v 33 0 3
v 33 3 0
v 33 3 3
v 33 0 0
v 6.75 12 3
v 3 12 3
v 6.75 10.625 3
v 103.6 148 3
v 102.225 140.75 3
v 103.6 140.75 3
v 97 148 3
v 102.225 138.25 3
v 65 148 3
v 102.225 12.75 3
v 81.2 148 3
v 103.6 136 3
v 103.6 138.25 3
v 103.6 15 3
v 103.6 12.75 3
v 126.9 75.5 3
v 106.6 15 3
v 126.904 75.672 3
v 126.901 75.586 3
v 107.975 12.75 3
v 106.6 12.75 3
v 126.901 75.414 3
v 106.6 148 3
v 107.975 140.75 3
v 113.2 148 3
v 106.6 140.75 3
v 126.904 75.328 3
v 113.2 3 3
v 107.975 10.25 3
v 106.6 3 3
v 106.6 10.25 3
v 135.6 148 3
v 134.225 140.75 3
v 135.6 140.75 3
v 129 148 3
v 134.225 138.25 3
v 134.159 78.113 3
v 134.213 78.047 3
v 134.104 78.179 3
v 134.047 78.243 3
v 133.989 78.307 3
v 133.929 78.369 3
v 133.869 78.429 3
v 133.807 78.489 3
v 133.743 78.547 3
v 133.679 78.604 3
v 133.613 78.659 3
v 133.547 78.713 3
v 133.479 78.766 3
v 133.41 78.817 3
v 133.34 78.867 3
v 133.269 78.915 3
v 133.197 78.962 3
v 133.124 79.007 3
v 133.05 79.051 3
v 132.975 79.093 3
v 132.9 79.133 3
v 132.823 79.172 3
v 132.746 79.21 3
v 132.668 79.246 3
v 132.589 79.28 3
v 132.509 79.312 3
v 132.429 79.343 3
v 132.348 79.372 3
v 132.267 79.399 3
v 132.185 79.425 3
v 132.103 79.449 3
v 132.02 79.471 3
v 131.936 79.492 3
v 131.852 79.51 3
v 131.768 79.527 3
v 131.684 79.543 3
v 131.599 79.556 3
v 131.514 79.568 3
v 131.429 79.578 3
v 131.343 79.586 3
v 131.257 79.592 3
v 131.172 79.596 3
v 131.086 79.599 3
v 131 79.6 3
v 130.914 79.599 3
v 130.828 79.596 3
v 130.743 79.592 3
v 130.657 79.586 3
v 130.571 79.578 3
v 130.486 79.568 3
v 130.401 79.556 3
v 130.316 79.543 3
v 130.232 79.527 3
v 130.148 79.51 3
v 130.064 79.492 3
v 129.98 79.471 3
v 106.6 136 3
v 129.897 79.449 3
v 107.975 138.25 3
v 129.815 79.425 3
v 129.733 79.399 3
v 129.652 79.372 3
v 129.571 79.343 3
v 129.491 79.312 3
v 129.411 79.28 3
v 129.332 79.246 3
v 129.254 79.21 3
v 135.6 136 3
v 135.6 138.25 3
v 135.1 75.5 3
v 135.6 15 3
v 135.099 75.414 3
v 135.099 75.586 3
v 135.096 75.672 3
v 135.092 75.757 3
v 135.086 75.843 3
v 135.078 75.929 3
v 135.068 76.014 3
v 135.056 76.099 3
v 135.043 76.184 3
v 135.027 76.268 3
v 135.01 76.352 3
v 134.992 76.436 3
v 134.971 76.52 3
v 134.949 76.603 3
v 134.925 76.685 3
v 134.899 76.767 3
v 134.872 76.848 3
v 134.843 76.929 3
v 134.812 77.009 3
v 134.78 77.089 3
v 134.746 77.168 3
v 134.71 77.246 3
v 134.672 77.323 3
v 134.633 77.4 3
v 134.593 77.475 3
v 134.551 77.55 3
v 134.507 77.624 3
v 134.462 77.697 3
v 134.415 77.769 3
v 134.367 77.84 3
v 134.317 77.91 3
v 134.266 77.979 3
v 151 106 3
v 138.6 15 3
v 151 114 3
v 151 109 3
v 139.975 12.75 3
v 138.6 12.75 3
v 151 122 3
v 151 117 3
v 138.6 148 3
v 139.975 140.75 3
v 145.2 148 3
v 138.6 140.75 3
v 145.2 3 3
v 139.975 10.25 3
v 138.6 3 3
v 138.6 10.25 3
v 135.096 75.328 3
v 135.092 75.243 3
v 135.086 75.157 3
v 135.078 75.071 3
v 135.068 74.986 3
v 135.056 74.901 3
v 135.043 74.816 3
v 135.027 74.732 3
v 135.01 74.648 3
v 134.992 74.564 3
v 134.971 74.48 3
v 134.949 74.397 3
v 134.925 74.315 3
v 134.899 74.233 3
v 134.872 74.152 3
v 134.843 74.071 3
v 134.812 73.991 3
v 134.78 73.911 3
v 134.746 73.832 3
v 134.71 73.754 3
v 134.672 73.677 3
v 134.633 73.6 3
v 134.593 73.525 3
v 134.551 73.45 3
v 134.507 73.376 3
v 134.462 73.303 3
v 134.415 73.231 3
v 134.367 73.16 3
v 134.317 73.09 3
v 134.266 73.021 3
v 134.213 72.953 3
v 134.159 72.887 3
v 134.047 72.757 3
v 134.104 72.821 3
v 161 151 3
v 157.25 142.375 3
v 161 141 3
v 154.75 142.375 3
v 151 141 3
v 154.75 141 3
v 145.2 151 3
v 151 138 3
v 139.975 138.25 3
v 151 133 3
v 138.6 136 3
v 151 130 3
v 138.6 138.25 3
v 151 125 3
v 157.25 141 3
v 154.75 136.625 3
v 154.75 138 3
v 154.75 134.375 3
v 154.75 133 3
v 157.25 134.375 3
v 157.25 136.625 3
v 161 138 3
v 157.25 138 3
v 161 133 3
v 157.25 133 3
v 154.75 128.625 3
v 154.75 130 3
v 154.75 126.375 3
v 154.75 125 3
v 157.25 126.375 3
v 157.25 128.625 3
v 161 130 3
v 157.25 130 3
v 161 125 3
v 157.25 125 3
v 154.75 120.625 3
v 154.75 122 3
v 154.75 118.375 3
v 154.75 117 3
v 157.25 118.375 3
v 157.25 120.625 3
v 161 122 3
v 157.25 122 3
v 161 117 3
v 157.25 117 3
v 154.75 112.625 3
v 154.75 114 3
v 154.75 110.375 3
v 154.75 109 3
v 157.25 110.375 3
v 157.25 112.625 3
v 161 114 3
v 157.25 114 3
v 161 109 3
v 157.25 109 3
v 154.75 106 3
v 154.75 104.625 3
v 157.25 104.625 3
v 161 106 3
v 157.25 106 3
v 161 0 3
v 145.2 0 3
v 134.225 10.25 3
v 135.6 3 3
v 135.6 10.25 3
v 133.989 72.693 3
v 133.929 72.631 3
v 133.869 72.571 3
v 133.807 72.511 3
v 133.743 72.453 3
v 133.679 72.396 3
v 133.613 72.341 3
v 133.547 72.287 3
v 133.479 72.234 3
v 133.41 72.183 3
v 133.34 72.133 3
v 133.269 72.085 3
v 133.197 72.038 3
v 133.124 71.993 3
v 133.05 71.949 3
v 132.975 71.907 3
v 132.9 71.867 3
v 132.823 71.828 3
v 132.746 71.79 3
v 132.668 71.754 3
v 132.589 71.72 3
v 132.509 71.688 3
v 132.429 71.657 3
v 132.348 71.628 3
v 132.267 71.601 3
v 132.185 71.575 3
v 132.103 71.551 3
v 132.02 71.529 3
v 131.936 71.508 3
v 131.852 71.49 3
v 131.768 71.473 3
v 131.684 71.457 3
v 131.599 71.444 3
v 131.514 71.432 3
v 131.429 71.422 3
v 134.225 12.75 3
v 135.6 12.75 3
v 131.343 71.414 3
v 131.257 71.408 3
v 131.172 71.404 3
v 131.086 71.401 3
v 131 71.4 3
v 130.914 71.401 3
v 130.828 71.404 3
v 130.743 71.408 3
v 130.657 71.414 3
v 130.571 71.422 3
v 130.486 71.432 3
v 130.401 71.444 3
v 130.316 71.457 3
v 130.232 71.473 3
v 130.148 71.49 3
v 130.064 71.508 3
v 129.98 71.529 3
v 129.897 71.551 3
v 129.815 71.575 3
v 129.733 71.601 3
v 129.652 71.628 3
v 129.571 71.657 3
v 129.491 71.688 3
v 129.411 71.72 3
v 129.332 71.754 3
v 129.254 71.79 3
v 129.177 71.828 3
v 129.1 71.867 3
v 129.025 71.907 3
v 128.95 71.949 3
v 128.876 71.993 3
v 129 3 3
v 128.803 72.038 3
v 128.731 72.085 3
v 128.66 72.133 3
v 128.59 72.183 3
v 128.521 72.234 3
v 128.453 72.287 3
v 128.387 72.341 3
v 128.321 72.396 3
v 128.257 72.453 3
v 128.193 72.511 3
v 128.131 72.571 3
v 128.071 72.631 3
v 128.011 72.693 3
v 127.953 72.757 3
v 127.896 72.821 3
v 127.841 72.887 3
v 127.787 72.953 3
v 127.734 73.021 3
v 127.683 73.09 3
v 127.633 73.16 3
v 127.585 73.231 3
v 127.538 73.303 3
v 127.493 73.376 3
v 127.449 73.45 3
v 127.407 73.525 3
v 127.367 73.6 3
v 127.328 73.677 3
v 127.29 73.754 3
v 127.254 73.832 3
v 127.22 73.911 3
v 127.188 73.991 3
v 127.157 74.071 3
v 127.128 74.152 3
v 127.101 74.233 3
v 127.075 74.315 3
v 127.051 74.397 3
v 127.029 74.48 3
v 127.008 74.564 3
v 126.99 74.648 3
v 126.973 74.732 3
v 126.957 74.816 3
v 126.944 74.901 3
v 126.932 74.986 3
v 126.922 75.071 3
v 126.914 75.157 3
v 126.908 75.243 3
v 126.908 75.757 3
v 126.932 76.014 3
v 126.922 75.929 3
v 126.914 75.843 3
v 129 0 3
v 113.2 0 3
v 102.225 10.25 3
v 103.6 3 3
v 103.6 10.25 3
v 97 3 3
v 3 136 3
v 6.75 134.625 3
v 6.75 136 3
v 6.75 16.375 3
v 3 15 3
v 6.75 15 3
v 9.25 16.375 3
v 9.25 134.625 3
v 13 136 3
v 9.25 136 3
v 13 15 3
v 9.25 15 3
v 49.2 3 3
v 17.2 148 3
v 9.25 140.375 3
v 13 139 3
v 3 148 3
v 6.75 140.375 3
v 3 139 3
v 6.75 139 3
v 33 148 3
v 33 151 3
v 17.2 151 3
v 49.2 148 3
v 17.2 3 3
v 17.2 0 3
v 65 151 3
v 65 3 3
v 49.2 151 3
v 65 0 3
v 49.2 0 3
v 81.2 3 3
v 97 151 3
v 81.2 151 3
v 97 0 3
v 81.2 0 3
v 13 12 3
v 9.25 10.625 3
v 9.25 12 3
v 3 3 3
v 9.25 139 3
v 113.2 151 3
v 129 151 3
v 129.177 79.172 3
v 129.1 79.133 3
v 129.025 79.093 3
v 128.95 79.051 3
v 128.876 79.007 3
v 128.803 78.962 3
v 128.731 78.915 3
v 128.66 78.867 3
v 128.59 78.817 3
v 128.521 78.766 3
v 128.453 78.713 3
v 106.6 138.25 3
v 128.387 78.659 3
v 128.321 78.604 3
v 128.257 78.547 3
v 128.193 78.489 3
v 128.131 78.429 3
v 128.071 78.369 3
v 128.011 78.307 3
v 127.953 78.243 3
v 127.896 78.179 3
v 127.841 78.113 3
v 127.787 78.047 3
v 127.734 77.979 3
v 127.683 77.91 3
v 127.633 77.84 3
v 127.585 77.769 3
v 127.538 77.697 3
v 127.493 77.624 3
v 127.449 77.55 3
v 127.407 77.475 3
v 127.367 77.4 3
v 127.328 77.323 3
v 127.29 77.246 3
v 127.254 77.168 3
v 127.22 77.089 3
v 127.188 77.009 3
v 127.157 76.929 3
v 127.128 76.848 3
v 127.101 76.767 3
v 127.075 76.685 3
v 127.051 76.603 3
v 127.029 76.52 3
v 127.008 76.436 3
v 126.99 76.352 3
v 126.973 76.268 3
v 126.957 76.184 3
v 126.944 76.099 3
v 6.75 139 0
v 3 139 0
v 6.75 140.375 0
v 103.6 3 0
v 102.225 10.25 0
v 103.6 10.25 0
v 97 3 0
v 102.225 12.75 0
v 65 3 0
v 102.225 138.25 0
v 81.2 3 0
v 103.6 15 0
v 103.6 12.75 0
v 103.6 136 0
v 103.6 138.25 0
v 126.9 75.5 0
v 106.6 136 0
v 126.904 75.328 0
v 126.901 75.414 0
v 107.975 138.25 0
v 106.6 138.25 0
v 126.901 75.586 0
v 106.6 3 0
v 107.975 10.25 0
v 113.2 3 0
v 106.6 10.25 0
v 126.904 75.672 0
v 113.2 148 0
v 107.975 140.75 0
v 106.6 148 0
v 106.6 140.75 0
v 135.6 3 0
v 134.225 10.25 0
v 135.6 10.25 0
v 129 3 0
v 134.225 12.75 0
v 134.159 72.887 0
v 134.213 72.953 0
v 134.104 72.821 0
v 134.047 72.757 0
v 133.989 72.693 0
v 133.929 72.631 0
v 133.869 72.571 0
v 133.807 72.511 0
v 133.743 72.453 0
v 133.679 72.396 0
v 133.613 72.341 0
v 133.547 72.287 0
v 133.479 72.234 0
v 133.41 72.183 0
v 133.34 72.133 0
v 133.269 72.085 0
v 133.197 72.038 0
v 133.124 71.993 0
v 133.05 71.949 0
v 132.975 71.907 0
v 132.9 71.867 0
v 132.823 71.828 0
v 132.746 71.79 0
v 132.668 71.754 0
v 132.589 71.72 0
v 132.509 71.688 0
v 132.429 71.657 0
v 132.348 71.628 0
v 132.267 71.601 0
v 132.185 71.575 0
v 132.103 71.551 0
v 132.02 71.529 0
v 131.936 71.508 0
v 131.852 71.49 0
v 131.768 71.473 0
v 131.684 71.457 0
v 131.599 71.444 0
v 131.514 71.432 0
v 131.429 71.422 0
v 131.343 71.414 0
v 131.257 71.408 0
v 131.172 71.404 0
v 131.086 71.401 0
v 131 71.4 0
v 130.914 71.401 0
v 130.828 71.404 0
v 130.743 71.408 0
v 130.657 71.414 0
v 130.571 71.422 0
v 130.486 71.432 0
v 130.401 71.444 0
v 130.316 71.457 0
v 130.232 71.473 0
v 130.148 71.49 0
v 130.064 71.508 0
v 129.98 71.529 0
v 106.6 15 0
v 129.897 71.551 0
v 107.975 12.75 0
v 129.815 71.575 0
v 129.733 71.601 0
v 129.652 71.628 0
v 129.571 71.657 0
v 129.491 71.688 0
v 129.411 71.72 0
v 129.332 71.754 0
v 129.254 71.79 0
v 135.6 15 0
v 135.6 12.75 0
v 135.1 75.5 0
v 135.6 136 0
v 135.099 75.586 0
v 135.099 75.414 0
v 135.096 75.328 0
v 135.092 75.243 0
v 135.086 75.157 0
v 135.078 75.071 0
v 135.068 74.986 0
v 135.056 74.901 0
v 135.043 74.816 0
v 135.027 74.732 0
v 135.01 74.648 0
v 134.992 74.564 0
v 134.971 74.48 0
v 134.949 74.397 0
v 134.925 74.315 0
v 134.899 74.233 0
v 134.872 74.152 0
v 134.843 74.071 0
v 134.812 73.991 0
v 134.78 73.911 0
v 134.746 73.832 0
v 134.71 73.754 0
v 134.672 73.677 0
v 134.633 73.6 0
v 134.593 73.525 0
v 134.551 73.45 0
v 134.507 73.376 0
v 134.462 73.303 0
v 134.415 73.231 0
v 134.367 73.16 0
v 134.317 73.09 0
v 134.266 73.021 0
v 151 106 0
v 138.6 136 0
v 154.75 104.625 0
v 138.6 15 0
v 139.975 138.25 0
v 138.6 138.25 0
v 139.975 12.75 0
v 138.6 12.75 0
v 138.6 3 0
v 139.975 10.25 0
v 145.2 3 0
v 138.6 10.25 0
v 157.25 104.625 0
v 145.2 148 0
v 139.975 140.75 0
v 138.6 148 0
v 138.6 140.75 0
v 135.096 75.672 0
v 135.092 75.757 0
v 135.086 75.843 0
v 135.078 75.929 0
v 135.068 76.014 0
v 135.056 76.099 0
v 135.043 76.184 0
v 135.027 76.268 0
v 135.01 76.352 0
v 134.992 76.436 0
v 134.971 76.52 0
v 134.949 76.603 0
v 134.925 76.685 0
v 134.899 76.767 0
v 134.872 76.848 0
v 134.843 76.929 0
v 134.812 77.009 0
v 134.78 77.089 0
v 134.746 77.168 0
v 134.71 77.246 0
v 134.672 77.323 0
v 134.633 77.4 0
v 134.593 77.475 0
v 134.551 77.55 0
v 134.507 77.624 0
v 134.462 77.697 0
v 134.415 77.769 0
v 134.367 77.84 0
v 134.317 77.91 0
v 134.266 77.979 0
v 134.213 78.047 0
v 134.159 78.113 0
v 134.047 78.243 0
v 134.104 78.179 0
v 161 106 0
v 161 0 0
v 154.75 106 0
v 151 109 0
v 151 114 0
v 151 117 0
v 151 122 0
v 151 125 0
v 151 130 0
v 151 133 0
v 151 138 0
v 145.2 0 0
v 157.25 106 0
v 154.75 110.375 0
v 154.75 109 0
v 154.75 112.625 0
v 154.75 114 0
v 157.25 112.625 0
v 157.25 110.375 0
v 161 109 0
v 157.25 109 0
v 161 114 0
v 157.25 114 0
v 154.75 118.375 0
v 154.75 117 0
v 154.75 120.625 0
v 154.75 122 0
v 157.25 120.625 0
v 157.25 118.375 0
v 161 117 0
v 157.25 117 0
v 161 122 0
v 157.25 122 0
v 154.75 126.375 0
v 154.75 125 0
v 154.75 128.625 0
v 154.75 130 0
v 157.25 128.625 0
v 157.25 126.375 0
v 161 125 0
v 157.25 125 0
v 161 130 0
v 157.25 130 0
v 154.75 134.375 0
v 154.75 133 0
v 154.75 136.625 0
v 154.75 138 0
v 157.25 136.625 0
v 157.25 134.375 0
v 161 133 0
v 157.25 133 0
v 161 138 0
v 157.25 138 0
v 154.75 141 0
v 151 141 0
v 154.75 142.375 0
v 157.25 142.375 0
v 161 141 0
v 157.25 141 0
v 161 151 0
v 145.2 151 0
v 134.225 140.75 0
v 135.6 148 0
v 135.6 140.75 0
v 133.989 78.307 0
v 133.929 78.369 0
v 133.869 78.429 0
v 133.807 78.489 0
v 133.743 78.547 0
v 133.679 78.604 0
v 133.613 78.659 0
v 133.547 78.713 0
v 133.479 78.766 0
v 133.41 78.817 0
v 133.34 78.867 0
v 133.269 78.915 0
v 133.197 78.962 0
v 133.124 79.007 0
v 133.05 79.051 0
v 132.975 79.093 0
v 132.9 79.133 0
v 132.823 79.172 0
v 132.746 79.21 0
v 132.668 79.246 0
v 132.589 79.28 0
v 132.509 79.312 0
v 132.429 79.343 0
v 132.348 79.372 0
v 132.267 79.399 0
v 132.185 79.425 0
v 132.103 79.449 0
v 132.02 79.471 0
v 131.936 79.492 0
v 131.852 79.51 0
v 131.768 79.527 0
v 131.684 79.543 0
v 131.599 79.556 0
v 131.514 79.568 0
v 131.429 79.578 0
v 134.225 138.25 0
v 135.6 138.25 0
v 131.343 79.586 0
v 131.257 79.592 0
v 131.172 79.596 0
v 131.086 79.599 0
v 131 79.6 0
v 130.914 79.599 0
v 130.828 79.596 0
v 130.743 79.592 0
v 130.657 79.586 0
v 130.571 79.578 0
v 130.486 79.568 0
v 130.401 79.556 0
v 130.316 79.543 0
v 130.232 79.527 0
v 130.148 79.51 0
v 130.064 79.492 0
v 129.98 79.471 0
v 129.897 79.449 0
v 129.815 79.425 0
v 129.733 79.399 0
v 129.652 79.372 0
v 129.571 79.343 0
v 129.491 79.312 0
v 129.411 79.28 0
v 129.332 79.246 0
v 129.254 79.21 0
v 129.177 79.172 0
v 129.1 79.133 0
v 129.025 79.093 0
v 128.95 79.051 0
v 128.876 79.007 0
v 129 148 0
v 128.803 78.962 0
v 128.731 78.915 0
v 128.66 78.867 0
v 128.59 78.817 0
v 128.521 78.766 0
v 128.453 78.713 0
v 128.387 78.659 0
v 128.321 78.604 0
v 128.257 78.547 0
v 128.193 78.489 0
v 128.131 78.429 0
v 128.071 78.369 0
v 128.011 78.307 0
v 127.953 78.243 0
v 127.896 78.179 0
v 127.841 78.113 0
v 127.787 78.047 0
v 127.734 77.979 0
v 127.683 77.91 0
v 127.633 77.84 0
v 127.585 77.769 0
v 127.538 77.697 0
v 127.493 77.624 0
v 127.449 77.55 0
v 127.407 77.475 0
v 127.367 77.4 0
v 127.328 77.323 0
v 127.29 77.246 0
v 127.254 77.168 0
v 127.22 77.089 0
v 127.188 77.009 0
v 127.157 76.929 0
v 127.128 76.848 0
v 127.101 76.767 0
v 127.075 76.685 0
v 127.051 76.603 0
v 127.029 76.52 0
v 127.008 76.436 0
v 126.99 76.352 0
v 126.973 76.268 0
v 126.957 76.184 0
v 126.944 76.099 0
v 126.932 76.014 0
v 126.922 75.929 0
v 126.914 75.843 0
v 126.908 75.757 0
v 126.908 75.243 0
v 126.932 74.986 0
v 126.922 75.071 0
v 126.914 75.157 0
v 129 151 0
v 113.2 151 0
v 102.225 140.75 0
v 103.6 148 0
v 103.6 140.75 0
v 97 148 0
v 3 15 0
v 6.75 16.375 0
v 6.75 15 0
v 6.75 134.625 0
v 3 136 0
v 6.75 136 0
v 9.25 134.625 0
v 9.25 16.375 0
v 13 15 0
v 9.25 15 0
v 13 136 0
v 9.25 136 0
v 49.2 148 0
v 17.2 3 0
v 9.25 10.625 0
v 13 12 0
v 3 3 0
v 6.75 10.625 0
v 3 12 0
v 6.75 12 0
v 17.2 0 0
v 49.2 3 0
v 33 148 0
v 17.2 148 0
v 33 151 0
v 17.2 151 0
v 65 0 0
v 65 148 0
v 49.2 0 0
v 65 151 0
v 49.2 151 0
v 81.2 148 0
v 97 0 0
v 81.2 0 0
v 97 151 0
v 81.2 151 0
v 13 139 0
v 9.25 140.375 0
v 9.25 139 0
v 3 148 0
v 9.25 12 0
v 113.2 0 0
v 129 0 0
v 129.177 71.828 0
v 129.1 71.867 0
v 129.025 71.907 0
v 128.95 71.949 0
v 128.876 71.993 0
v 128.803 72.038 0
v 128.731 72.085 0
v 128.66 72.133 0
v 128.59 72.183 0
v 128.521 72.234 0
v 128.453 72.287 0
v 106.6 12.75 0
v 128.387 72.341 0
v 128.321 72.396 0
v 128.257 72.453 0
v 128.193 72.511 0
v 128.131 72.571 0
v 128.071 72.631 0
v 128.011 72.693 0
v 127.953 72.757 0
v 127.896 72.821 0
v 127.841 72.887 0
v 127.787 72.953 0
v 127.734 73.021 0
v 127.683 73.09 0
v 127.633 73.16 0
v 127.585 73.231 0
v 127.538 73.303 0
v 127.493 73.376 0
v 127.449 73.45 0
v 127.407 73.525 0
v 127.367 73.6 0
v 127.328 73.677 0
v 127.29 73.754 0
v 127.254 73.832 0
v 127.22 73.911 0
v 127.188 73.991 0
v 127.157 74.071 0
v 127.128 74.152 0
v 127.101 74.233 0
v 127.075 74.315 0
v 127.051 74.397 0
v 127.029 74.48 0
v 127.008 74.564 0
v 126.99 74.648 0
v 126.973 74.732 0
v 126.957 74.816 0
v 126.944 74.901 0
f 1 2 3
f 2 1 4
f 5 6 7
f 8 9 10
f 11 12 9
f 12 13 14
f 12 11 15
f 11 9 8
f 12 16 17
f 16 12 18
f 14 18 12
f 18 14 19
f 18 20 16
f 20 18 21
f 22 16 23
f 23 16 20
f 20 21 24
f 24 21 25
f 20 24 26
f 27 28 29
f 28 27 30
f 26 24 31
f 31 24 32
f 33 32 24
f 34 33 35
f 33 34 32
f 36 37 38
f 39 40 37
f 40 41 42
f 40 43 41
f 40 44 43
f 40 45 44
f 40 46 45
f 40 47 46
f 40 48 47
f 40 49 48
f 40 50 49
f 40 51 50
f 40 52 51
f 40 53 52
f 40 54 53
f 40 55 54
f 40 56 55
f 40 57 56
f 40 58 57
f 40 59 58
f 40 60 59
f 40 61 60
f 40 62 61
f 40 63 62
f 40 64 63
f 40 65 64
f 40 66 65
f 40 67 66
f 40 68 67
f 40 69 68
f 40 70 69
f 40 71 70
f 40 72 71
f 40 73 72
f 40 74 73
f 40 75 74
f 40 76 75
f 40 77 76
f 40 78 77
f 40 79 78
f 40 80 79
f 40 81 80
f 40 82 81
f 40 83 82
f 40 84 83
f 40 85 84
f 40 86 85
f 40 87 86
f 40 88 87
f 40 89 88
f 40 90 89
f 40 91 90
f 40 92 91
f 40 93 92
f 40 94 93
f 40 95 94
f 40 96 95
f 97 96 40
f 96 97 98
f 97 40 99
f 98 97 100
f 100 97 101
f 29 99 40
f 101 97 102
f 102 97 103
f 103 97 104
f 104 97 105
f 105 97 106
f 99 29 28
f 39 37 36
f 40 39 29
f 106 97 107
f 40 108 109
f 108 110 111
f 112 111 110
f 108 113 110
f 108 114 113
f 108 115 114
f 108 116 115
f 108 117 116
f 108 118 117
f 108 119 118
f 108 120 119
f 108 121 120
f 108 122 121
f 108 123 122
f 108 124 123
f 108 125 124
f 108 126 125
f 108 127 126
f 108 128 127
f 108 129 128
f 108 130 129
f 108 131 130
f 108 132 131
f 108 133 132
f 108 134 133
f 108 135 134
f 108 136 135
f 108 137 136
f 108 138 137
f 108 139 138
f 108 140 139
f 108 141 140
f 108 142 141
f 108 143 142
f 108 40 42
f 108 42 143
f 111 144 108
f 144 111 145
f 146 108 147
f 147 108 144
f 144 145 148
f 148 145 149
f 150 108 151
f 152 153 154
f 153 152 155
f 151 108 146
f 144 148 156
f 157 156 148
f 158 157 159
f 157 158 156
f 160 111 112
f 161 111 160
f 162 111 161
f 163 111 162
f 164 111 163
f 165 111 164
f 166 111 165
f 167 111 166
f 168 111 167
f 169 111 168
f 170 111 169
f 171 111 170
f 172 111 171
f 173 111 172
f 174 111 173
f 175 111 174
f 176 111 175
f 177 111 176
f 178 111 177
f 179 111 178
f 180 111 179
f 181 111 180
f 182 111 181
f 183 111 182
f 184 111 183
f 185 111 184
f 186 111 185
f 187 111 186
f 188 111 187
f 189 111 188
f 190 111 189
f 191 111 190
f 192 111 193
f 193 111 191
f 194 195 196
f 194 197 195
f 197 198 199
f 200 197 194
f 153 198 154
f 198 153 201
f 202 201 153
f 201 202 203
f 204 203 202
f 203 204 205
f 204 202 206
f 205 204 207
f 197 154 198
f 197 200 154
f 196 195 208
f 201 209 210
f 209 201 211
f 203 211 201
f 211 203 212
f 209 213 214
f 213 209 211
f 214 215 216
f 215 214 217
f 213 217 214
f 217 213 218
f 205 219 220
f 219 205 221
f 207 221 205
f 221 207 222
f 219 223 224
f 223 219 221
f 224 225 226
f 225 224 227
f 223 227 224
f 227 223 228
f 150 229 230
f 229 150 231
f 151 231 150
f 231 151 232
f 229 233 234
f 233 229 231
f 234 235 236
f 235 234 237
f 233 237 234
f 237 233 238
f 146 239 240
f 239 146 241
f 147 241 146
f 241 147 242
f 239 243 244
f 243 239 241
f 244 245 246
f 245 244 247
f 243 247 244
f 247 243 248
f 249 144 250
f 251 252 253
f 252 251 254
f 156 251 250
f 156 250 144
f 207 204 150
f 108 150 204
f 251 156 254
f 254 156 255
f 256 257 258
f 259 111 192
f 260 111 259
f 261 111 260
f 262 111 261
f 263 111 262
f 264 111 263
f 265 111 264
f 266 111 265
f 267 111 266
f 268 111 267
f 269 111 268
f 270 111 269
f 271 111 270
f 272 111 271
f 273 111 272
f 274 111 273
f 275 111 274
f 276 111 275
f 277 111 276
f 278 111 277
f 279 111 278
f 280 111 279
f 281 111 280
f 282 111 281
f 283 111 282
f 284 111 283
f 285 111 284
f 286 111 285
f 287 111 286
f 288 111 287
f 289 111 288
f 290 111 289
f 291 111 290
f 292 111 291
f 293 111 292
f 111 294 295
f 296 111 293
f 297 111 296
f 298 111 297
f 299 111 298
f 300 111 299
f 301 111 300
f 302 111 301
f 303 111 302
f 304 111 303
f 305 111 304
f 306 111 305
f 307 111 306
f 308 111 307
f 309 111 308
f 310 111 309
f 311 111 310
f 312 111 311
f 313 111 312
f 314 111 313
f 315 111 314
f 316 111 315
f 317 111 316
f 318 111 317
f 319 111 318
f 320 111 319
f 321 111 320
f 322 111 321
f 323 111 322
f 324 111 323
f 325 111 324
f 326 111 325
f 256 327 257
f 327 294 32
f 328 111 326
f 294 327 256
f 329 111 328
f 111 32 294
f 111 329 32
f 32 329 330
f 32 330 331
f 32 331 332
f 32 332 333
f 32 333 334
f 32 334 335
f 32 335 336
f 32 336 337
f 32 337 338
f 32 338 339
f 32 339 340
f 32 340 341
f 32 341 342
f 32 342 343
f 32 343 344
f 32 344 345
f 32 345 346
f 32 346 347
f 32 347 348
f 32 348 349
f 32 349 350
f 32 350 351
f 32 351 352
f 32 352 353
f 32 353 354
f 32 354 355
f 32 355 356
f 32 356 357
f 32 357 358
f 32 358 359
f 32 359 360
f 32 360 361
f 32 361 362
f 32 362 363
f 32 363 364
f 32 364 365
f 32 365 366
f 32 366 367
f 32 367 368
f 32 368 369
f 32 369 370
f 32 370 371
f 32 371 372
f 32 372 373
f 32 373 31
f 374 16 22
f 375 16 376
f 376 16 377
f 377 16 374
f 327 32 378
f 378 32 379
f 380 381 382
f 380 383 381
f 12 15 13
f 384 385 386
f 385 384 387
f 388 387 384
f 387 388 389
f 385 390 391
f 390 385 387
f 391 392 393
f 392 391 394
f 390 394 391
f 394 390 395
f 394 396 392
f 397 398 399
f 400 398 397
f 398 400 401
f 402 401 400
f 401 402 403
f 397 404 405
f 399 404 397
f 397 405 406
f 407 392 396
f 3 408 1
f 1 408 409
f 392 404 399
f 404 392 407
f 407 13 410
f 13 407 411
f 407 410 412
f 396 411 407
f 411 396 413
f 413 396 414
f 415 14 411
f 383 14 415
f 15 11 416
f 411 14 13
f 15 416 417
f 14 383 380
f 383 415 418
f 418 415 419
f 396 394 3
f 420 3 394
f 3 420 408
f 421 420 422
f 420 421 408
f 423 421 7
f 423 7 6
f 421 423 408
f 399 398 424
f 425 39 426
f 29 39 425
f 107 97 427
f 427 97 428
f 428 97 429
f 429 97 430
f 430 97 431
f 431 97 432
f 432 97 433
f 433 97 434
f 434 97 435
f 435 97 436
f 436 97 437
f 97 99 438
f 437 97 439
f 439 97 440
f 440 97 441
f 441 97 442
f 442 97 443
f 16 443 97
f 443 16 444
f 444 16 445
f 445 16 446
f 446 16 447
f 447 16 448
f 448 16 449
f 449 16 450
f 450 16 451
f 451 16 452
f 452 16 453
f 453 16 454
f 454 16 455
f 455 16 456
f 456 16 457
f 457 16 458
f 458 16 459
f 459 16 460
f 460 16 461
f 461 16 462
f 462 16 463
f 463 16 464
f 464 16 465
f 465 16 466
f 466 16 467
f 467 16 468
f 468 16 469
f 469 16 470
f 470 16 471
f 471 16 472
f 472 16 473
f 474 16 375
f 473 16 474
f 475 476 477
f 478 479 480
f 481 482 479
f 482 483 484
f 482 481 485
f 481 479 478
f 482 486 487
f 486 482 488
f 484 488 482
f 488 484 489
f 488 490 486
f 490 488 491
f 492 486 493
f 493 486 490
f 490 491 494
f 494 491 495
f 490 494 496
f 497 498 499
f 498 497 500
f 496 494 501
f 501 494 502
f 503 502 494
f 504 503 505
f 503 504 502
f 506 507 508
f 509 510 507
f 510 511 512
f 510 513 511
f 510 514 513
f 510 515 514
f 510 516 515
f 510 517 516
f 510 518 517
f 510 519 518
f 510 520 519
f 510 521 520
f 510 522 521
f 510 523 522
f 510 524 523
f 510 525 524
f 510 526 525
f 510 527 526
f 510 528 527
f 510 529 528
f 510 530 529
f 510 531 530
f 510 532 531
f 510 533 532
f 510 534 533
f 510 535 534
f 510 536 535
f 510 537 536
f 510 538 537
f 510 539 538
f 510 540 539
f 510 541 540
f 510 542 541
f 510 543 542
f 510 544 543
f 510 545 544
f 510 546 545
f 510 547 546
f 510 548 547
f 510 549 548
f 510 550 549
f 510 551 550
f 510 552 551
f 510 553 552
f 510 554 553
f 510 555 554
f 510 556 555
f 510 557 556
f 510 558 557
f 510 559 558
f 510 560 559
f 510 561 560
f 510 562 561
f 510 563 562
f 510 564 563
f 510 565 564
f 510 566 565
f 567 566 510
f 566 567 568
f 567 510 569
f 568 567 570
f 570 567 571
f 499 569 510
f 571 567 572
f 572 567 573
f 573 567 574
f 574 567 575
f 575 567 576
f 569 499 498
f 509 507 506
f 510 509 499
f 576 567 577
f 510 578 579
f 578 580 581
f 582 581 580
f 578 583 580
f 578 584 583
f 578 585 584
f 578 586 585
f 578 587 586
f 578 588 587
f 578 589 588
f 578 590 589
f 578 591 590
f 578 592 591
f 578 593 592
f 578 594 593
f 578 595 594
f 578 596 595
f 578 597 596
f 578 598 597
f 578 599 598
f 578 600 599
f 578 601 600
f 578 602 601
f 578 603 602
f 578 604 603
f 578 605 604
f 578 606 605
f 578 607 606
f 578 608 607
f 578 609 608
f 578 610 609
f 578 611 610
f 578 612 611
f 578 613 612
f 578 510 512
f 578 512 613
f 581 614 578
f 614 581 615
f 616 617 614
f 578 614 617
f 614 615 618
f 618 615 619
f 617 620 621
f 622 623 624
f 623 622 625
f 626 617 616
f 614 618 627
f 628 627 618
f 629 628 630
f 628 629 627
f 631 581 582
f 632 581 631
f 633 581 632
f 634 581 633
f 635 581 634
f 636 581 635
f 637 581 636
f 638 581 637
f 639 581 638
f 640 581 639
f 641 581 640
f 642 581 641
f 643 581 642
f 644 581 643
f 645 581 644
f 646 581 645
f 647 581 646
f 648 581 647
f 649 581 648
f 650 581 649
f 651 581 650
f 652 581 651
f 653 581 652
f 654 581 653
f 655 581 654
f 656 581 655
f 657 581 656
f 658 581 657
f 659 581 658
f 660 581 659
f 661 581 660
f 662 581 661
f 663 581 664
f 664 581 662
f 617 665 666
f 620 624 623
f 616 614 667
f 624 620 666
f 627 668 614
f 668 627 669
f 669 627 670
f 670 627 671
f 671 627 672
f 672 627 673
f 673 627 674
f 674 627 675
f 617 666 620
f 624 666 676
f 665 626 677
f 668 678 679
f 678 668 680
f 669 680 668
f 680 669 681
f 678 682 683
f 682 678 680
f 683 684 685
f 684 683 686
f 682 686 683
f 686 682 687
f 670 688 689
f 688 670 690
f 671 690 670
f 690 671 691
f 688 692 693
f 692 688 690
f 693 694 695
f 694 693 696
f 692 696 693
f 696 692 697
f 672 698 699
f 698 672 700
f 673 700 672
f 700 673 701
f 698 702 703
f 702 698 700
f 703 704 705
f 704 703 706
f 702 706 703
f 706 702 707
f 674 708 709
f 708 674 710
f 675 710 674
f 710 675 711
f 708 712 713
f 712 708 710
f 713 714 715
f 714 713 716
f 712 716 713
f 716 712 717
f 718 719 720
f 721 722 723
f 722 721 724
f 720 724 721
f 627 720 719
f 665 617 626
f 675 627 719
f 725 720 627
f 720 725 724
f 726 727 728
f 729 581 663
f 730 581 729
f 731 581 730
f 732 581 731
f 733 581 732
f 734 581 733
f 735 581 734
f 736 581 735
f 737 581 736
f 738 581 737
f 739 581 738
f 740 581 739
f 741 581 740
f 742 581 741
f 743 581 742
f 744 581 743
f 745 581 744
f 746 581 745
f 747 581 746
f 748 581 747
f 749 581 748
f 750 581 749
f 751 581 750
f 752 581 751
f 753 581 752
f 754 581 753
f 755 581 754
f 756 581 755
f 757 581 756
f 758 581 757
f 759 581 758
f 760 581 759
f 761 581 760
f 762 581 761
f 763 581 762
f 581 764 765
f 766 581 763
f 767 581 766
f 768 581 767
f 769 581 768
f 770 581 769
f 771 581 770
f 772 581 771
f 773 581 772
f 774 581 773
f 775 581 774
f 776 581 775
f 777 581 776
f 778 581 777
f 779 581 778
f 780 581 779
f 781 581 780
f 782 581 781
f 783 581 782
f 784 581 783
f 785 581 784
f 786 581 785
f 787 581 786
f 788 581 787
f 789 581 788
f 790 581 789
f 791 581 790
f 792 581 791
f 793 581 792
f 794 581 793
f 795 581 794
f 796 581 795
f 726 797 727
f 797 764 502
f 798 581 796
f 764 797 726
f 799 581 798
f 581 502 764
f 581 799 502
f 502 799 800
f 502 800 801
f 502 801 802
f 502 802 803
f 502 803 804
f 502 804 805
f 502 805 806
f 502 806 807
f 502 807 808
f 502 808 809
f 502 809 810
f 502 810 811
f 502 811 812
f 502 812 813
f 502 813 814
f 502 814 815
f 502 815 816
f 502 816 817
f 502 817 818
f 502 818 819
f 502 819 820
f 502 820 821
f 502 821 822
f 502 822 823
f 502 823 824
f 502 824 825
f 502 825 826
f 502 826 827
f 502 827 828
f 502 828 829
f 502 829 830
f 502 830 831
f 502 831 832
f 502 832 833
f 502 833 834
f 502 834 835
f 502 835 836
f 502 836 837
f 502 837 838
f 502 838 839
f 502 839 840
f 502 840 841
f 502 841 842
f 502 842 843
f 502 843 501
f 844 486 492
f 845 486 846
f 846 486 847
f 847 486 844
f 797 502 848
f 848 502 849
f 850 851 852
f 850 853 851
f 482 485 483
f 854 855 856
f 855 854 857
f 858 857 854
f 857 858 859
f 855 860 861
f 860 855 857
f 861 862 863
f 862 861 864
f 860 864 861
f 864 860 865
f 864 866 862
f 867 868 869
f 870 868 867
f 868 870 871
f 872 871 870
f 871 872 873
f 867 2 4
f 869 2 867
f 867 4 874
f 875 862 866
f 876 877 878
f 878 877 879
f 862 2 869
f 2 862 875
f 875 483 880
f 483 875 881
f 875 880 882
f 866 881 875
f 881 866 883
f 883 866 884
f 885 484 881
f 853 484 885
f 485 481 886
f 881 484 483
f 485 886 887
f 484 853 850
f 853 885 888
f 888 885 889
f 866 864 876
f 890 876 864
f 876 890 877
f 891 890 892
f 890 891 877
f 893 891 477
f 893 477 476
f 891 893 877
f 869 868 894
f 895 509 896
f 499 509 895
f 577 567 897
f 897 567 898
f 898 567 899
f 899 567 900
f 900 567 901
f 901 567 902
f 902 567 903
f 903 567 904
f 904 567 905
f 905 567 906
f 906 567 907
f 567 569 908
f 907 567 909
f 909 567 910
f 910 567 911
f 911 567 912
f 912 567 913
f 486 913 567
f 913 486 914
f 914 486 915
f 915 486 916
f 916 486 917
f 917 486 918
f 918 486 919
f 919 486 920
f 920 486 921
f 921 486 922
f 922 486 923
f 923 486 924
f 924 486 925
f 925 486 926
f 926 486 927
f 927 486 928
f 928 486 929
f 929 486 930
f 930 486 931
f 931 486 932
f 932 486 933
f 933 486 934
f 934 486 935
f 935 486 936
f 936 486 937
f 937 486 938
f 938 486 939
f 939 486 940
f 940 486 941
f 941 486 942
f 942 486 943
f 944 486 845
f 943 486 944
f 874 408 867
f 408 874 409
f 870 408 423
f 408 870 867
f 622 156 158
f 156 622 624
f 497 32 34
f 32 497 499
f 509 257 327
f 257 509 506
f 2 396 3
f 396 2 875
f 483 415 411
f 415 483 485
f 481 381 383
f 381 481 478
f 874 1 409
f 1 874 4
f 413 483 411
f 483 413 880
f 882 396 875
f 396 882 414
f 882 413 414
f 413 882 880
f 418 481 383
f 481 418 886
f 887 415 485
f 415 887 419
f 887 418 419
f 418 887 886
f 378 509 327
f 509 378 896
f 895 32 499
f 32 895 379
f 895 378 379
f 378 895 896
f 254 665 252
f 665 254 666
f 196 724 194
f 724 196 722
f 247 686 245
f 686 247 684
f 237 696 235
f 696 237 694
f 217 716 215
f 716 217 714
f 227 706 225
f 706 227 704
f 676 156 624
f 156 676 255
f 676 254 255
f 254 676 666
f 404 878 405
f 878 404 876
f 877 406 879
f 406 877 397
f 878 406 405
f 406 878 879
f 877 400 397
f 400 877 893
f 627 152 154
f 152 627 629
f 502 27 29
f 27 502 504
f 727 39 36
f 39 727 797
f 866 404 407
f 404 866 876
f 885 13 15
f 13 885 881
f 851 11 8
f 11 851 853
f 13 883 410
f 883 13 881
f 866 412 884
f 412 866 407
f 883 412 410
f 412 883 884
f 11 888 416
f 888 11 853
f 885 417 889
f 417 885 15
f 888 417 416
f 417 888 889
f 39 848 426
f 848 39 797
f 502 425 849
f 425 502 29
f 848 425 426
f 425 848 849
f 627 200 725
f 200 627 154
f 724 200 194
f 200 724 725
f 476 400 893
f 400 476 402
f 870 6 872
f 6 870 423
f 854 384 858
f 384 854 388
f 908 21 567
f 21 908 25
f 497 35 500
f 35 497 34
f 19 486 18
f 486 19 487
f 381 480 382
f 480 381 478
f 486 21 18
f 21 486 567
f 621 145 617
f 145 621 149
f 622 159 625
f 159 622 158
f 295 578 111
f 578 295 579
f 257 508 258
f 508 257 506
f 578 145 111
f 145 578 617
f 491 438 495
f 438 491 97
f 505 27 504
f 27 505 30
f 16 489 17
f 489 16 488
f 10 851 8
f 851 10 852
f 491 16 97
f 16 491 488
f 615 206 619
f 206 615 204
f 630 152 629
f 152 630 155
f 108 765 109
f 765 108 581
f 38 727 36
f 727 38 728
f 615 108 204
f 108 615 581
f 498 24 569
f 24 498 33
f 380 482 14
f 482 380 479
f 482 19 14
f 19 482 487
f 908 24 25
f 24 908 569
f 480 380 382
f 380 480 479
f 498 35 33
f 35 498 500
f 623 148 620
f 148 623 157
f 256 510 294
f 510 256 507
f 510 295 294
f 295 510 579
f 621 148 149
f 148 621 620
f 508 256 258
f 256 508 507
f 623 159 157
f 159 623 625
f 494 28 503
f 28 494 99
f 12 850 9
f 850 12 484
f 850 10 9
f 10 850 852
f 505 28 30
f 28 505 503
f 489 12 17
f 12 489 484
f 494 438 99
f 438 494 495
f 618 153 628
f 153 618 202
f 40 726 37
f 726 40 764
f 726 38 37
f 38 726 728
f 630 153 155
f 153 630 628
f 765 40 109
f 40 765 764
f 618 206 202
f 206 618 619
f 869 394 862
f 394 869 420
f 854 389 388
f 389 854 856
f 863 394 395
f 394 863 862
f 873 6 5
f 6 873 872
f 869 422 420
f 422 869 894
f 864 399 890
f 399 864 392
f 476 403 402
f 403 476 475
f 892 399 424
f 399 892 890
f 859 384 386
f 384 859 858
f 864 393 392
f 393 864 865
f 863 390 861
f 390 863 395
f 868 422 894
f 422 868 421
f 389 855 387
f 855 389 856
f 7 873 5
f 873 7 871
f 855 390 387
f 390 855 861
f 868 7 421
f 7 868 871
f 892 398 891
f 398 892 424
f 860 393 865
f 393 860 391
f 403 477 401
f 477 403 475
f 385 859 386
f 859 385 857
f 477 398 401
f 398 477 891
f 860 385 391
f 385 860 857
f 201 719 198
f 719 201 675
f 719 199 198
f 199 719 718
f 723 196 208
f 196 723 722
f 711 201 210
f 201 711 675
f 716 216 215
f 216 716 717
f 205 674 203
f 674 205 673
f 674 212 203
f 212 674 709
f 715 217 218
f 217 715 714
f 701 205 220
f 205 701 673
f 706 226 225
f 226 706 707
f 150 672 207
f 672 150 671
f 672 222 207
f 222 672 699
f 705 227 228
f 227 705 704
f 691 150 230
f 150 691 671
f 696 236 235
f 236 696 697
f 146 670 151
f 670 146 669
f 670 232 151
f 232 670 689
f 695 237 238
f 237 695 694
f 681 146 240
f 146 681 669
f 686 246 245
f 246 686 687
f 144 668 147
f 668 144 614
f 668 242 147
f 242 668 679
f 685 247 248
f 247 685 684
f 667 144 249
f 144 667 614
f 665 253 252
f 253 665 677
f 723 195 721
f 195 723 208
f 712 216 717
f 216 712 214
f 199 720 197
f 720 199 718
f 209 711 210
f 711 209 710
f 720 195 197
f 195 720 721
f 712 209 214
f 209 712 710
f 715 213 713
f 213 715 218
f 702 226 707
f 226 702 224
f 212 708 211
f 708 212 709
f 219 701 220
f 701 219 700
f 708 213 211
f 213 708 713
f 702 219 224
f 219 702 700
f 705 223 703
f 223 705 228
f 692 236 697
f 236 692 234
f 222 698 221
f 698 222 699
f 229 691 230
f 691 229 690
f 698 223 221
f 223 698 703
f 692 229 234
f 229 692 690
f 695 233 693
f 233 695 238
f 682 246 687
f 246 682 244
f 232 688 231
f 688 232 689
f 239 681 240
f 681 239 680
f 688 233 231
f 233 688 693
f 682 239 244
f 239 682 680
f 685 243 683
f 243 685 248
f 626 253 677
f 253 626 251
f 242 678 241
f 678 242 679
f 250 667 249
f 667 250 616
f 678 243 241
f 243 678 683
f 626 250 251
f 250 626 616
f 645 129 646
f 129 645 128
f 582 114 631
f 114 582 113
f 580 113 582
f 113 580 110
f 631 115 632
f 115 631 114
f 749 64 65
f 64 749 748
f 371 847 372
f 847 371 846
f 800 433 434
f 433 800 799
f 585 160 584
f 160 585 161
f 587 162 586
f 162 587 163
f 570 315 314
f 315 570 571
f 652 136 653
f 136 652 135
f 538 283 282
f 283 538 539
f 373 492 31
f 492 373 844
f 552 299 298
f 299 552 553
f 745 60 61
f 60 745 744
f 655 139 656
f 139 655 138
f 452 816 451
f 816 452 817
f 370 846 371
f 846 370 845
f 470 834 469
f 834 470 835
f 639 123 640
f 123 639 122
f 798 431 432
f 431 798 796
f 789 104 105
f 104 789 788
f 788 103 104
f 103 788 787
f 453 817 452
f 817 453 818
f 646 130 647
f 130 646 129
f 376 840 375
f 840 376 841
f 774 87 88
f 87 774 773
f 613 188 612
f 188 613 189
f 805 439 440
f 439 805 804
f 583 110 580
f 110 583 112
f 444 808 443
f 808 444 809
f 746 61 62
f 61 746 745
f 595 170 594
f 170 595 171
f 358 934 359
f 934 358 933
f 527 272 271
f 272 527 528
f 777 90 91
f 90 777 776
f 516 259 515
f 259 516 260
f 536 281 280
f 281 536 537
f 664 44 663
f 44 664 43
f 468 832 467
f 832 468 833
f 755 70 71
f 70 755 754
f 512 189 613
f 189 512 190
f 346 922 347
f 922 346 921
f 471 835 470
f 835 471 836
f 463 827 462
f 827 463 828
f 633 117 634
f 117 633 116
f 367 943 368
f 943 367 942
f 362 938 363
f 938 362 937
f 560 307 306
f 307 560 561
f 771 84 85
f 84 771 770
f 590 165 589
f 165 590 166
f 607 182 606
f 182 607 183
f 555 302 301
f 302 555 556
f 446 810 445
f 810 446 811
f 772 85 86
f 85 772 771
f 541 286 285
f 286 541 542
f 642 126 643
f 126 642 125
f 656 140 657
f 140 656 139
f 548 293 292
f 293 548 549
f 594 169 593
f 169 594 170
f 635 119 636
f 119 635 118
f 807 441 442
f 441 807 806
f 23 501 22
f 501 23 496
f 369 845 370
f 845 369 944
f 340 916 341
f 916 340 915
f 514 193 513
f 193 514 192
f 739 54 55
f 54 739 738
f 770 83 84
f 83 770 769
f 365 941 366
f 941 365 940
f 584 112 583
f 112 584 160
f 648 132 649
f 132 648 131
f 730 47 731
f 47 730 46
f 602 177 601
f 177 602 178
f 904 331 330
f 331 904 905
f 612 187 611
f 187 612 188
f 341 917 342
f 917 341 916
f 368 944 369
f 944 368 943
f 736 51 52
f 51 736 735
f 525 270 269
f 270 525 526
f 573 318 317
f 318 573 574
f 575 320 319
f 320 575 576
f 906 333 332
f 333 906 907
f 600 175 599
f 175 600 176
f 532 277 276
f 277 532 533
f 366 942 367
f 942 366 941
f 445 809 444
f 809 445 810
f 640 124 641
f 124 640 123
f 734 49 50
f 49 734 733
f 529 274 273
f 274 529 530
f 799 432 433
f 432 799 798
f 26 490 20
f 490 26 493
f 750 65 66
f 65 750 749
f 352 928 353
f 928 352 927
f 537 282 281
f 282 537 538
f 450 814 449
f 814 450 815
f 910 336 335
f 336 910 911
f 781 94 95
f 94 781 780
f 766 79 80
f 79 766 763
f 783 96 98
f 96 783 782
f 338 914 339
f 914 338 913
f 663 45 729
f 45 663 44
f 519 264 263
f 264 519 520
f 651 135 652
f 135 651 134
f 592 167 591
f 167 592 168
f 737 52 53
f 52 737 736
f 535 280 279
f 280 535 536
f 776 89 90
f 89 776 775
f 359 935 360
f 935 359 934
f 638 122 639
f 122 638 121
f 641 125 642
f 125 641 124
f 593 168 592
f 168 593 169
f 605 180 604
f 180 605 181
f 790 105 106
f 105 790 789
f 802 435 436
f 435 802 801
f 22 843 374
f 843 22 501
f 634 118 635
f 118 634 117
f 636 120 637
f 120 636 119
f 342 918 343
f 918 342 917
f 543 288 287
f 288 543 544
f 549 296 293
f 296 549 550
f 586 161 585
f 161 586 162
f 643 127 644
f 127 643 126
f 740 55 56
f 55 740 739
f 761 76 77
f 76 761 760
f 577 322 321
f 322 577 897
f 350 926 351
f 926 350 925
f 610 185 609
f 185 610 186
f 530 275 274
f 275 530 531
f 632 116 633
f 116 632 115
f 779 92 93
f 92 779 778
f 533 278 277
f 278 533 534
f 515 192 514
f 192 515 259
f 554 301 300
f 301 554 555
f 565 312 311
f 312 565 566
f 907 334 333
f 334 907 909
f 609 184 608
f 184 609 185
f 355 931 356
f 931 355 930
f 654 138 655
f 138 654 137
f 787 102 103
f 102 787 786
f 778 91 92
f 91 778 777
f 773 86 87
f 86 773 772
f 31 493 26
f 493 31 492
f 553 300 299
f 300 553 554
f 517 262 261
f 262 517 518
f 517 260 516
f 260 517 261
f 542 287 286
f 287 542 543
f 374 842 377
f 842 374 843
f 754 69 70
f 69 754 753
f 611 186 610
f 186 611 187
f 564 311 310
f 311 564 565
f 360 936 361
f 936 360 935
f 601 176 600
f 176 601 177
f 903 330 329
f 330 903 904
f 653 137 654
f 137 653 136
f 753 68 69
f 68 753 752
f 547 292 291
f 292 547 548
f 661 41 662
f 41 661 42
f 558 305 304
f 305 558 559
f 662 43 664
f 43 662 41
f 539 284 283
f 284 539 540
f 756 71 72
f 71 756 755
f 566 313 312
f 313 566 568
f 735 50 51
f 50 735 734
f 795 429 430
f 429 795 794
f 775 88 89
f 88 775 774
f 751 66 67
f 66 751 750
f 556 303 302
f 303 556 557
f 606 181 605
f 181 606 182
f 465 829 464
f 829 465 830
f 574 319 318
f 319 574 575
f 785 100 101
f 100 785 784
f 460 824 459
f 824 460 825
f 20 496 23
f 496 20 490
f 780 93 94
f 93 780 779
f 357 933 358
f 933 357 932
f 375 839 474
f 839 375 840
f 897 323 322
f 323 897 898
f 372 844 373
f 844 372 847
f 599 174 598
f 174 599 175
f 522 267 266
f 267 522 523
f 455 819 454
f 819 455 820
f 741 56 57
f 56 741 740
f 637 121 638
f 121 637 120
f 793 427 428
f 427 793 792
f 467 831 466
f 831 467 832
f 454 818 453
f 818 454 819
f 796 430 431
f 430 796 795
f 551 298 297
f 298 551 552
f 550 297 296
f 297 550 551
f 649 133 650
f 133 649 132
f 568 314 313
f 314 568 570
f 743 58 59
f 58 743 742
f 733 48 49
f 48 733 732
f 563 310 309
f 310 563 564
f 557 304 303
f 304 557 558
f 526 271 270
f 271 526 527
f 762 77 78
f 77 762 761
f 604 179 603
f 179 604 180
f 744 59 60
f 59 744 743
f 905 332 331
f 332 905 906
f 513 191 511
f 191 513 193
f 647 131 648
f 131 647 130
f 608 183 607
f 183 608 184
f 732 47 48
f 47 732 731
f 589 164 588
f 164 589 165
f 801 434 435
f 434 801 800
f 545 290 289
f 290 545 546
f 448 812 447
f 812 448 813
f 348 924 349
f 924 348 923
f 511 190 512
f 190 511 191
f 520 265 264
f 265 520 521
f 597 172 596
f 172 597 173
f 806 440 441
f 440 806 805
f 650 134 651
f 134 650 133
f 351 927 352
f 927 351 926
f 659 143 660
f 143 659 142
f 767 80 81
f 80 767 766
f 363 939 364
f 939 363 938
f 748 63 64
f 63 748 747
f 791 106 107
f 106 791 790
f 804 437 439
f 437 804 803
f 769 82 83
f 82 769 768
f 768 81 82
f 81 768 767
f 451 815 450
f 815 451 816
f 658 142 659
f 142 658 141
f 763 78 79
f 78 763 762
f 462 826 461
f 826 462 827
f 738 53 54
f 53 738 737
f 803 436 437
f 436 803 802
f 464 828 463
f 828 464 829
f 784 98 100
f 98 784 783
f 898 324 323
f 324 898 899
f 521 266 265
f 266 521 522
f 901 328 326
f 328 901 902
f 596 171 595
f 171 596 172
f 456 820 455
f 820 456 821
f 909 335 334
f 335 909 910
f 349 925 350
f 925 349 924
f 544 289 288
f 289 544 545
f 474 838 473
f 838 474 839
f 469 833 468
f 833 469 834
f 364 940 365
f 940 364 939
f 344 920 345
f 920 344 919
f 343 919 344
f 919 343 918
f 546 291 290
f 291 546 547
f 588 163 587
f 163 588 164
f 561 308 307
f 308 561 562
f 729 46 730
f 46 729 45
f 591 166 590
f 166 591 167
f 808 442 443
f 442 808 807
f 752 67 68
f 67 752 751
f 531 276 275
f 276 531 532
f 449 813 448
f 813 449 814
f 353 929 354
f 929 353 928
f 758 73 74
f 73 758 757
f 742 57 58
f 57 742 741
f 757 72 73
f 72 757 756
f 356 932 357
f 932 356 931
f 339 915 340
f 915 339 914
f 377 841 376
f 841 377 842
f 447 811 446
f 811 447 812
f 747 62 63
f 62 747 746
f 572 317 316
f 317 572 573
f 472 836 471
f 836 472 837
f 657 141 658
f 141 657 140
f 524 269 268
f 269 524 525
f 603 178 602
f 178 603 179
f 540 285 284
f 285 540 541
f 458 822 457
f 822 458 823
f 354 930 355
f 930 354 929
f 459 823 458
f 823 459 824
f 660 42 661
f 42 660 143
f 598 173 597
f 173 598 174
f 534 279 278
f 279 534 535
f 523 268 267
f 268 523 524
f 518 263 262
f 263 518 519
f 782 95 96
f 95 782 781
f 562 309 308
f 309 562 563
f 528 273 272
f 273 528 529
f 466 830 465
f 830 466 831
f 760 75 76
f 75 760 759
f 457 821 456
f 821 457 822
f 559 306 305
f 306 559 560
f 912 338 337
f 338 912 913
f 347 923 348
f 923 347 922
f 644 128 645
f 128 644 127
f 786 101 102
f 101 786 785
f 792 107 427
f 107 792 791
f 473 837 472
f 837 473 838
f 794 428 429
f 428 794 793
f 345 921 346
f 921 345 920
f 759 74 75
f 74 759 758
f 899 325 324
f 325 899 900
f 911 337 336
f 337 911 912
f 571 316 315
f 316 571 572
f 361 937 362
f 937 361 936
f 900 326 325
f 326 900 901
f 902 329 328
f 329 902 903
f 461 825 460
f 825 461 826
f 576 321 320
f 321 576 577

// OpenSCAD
mel = 22;//move_everything_left
//next version - keep teeth length as a variable parameter
lct = 3; // Laser Cut thickness
t_length = 10;// length of t-slot screw
t_thick = 3;// diameter of t-slot screw
dim_x = 86 + 140 - 50 + t_length-mel; // Total size excluding lct, now 86
dim_y =  151;//height was 166 before, now 151
nut_dia = 5.75;// diameter of t-slot nut
nut_thick = 2.5;// thickness of t-slot nut
dia_c = 8.2; //diameter of center hole (changed from 8.1)
rad_c = dia_c/2;

tol = .1; //teeth tolerance
bthp = 12;//back t hole position (here back is left side)
fthp = 10;//fromt t hole position (here front is right side)
fth_sep =8; //front t hole separation


difference(){

//cuboid, teeth top & bottom
union(){
    translate([lct,lct,0])cube([dim_x-2*lct,dim_y-2*lct,lct]);//cuboid
    for(x=[lct+tol+4/*offset*/+tol/*as teeth r reduced by tol b4, it should be included in offset*/+32:32:dim_x-2*lct+mel])translate([x-mel,0,0])cube([16-2*tol,lct,lct]);//teeth bottom
    for(x=[lct+tol+4+tol+32/*due_to_mel*/:32:dim_x-2*lct+mel])translate([x-mel,dim_y-lct,0])cube([16-2*tol,lct,lct]);//teeth top
}

//screw holes top & bottom
union(){
    for(x=[lct+16+((16-t_thick)/2)+4/*offset*/+tol+96/*last_2_only_req*/:32:128 + 5/*greater than 4+tol is enough*/ + lct+16+((16-t_thick)/2)])/*x & 32+x*/translate([x-mel,0,0])color("red")cube([t_thick,t_length+5/*new screw*/,lct]);//screw hole bottom
    for(x=[lct+16+((16-t_thick)/2)+4+tol+96/*last_2_only_req*/:32:128+5 + lct+16+((16-t_thick)/2)])translate([x-mel,dim_y-t_length-5/*new_screw*/,0])color("red")cube([t_thick,t_length+5/*new_screw*/,lct]);//screw hole top
}

//nut holes top & bottom 
union(){
    for(x=[(lct+16+((16-t_thick)/2))/*dist bw O and screwhole*/-((nut_dia-t_thick)/2)/*dist diff screwhole & nuthole*/+4+tol+96/*last_2_only_req*/:32:dim_x])translate([x-mel,lct+(t_length-lct-nut_thick)/2+5/*new screw*/,0])cube([nut_dia,nut_thick,lct]);//nut hole bottom
    for(x=[(lct+16+((16-t_thick)/2))/*dist bw O and screwhole*/-((nut_dia-t_thick)/2)/*dist diff screwhole & nuthole*/+4+tol+96/*last_2_only_req*/:32:dim_x])translate([x-mel,dim_y-lct-((t_length-lct-nut_thick)/2)-nut_thick-5/*new screw*/,0])cube([nut_dia,nut_thick,lct]);//nut hole top
}

//nut holes left & right
union(){
	for(y=[bthp,dim_y-bthp-t_thick])translate([lct/*lct added, change to 0 if required,tscrew will look small*/,y,0])cube([t_length,t_thick,lct]);//screwhole left side(back)
    for(y=[bthp-((nut_dia-t_thick)/2),dim_y-bthp-((nut_dia-t_thick)/2)-t_thick])translate([lct+((t_length-nut_thick)/2),y,0])cube([nut_thick,nut_dia,lct]);//nuthole left side(back)
    
    
    for(y=[dim_y-fthp-t_thick:-fth_sep:100])translate([dim_x-t_length-lct/*lct added*/,y,0])cube([t_length,t_thick,lct]);//screwhole right side(front)
    for(y=[dim_y-fthp-((nut_dia-t_thick)/2)-t_thick:-fth_sep:100])translate([dim_x-lct-((t_length-nut_thick)/2)-nut_thick,y,0])cube([nut_thick,nut_dia,lct]);//nuthole right side(front)
}

//center hole - 33mm from right of X dimension
translate([dim_x-33,dim_y/2,0])color("blue")cylinder(lct,r1=rad_c,r2=rad_c,center=false,$fn=300);



}
